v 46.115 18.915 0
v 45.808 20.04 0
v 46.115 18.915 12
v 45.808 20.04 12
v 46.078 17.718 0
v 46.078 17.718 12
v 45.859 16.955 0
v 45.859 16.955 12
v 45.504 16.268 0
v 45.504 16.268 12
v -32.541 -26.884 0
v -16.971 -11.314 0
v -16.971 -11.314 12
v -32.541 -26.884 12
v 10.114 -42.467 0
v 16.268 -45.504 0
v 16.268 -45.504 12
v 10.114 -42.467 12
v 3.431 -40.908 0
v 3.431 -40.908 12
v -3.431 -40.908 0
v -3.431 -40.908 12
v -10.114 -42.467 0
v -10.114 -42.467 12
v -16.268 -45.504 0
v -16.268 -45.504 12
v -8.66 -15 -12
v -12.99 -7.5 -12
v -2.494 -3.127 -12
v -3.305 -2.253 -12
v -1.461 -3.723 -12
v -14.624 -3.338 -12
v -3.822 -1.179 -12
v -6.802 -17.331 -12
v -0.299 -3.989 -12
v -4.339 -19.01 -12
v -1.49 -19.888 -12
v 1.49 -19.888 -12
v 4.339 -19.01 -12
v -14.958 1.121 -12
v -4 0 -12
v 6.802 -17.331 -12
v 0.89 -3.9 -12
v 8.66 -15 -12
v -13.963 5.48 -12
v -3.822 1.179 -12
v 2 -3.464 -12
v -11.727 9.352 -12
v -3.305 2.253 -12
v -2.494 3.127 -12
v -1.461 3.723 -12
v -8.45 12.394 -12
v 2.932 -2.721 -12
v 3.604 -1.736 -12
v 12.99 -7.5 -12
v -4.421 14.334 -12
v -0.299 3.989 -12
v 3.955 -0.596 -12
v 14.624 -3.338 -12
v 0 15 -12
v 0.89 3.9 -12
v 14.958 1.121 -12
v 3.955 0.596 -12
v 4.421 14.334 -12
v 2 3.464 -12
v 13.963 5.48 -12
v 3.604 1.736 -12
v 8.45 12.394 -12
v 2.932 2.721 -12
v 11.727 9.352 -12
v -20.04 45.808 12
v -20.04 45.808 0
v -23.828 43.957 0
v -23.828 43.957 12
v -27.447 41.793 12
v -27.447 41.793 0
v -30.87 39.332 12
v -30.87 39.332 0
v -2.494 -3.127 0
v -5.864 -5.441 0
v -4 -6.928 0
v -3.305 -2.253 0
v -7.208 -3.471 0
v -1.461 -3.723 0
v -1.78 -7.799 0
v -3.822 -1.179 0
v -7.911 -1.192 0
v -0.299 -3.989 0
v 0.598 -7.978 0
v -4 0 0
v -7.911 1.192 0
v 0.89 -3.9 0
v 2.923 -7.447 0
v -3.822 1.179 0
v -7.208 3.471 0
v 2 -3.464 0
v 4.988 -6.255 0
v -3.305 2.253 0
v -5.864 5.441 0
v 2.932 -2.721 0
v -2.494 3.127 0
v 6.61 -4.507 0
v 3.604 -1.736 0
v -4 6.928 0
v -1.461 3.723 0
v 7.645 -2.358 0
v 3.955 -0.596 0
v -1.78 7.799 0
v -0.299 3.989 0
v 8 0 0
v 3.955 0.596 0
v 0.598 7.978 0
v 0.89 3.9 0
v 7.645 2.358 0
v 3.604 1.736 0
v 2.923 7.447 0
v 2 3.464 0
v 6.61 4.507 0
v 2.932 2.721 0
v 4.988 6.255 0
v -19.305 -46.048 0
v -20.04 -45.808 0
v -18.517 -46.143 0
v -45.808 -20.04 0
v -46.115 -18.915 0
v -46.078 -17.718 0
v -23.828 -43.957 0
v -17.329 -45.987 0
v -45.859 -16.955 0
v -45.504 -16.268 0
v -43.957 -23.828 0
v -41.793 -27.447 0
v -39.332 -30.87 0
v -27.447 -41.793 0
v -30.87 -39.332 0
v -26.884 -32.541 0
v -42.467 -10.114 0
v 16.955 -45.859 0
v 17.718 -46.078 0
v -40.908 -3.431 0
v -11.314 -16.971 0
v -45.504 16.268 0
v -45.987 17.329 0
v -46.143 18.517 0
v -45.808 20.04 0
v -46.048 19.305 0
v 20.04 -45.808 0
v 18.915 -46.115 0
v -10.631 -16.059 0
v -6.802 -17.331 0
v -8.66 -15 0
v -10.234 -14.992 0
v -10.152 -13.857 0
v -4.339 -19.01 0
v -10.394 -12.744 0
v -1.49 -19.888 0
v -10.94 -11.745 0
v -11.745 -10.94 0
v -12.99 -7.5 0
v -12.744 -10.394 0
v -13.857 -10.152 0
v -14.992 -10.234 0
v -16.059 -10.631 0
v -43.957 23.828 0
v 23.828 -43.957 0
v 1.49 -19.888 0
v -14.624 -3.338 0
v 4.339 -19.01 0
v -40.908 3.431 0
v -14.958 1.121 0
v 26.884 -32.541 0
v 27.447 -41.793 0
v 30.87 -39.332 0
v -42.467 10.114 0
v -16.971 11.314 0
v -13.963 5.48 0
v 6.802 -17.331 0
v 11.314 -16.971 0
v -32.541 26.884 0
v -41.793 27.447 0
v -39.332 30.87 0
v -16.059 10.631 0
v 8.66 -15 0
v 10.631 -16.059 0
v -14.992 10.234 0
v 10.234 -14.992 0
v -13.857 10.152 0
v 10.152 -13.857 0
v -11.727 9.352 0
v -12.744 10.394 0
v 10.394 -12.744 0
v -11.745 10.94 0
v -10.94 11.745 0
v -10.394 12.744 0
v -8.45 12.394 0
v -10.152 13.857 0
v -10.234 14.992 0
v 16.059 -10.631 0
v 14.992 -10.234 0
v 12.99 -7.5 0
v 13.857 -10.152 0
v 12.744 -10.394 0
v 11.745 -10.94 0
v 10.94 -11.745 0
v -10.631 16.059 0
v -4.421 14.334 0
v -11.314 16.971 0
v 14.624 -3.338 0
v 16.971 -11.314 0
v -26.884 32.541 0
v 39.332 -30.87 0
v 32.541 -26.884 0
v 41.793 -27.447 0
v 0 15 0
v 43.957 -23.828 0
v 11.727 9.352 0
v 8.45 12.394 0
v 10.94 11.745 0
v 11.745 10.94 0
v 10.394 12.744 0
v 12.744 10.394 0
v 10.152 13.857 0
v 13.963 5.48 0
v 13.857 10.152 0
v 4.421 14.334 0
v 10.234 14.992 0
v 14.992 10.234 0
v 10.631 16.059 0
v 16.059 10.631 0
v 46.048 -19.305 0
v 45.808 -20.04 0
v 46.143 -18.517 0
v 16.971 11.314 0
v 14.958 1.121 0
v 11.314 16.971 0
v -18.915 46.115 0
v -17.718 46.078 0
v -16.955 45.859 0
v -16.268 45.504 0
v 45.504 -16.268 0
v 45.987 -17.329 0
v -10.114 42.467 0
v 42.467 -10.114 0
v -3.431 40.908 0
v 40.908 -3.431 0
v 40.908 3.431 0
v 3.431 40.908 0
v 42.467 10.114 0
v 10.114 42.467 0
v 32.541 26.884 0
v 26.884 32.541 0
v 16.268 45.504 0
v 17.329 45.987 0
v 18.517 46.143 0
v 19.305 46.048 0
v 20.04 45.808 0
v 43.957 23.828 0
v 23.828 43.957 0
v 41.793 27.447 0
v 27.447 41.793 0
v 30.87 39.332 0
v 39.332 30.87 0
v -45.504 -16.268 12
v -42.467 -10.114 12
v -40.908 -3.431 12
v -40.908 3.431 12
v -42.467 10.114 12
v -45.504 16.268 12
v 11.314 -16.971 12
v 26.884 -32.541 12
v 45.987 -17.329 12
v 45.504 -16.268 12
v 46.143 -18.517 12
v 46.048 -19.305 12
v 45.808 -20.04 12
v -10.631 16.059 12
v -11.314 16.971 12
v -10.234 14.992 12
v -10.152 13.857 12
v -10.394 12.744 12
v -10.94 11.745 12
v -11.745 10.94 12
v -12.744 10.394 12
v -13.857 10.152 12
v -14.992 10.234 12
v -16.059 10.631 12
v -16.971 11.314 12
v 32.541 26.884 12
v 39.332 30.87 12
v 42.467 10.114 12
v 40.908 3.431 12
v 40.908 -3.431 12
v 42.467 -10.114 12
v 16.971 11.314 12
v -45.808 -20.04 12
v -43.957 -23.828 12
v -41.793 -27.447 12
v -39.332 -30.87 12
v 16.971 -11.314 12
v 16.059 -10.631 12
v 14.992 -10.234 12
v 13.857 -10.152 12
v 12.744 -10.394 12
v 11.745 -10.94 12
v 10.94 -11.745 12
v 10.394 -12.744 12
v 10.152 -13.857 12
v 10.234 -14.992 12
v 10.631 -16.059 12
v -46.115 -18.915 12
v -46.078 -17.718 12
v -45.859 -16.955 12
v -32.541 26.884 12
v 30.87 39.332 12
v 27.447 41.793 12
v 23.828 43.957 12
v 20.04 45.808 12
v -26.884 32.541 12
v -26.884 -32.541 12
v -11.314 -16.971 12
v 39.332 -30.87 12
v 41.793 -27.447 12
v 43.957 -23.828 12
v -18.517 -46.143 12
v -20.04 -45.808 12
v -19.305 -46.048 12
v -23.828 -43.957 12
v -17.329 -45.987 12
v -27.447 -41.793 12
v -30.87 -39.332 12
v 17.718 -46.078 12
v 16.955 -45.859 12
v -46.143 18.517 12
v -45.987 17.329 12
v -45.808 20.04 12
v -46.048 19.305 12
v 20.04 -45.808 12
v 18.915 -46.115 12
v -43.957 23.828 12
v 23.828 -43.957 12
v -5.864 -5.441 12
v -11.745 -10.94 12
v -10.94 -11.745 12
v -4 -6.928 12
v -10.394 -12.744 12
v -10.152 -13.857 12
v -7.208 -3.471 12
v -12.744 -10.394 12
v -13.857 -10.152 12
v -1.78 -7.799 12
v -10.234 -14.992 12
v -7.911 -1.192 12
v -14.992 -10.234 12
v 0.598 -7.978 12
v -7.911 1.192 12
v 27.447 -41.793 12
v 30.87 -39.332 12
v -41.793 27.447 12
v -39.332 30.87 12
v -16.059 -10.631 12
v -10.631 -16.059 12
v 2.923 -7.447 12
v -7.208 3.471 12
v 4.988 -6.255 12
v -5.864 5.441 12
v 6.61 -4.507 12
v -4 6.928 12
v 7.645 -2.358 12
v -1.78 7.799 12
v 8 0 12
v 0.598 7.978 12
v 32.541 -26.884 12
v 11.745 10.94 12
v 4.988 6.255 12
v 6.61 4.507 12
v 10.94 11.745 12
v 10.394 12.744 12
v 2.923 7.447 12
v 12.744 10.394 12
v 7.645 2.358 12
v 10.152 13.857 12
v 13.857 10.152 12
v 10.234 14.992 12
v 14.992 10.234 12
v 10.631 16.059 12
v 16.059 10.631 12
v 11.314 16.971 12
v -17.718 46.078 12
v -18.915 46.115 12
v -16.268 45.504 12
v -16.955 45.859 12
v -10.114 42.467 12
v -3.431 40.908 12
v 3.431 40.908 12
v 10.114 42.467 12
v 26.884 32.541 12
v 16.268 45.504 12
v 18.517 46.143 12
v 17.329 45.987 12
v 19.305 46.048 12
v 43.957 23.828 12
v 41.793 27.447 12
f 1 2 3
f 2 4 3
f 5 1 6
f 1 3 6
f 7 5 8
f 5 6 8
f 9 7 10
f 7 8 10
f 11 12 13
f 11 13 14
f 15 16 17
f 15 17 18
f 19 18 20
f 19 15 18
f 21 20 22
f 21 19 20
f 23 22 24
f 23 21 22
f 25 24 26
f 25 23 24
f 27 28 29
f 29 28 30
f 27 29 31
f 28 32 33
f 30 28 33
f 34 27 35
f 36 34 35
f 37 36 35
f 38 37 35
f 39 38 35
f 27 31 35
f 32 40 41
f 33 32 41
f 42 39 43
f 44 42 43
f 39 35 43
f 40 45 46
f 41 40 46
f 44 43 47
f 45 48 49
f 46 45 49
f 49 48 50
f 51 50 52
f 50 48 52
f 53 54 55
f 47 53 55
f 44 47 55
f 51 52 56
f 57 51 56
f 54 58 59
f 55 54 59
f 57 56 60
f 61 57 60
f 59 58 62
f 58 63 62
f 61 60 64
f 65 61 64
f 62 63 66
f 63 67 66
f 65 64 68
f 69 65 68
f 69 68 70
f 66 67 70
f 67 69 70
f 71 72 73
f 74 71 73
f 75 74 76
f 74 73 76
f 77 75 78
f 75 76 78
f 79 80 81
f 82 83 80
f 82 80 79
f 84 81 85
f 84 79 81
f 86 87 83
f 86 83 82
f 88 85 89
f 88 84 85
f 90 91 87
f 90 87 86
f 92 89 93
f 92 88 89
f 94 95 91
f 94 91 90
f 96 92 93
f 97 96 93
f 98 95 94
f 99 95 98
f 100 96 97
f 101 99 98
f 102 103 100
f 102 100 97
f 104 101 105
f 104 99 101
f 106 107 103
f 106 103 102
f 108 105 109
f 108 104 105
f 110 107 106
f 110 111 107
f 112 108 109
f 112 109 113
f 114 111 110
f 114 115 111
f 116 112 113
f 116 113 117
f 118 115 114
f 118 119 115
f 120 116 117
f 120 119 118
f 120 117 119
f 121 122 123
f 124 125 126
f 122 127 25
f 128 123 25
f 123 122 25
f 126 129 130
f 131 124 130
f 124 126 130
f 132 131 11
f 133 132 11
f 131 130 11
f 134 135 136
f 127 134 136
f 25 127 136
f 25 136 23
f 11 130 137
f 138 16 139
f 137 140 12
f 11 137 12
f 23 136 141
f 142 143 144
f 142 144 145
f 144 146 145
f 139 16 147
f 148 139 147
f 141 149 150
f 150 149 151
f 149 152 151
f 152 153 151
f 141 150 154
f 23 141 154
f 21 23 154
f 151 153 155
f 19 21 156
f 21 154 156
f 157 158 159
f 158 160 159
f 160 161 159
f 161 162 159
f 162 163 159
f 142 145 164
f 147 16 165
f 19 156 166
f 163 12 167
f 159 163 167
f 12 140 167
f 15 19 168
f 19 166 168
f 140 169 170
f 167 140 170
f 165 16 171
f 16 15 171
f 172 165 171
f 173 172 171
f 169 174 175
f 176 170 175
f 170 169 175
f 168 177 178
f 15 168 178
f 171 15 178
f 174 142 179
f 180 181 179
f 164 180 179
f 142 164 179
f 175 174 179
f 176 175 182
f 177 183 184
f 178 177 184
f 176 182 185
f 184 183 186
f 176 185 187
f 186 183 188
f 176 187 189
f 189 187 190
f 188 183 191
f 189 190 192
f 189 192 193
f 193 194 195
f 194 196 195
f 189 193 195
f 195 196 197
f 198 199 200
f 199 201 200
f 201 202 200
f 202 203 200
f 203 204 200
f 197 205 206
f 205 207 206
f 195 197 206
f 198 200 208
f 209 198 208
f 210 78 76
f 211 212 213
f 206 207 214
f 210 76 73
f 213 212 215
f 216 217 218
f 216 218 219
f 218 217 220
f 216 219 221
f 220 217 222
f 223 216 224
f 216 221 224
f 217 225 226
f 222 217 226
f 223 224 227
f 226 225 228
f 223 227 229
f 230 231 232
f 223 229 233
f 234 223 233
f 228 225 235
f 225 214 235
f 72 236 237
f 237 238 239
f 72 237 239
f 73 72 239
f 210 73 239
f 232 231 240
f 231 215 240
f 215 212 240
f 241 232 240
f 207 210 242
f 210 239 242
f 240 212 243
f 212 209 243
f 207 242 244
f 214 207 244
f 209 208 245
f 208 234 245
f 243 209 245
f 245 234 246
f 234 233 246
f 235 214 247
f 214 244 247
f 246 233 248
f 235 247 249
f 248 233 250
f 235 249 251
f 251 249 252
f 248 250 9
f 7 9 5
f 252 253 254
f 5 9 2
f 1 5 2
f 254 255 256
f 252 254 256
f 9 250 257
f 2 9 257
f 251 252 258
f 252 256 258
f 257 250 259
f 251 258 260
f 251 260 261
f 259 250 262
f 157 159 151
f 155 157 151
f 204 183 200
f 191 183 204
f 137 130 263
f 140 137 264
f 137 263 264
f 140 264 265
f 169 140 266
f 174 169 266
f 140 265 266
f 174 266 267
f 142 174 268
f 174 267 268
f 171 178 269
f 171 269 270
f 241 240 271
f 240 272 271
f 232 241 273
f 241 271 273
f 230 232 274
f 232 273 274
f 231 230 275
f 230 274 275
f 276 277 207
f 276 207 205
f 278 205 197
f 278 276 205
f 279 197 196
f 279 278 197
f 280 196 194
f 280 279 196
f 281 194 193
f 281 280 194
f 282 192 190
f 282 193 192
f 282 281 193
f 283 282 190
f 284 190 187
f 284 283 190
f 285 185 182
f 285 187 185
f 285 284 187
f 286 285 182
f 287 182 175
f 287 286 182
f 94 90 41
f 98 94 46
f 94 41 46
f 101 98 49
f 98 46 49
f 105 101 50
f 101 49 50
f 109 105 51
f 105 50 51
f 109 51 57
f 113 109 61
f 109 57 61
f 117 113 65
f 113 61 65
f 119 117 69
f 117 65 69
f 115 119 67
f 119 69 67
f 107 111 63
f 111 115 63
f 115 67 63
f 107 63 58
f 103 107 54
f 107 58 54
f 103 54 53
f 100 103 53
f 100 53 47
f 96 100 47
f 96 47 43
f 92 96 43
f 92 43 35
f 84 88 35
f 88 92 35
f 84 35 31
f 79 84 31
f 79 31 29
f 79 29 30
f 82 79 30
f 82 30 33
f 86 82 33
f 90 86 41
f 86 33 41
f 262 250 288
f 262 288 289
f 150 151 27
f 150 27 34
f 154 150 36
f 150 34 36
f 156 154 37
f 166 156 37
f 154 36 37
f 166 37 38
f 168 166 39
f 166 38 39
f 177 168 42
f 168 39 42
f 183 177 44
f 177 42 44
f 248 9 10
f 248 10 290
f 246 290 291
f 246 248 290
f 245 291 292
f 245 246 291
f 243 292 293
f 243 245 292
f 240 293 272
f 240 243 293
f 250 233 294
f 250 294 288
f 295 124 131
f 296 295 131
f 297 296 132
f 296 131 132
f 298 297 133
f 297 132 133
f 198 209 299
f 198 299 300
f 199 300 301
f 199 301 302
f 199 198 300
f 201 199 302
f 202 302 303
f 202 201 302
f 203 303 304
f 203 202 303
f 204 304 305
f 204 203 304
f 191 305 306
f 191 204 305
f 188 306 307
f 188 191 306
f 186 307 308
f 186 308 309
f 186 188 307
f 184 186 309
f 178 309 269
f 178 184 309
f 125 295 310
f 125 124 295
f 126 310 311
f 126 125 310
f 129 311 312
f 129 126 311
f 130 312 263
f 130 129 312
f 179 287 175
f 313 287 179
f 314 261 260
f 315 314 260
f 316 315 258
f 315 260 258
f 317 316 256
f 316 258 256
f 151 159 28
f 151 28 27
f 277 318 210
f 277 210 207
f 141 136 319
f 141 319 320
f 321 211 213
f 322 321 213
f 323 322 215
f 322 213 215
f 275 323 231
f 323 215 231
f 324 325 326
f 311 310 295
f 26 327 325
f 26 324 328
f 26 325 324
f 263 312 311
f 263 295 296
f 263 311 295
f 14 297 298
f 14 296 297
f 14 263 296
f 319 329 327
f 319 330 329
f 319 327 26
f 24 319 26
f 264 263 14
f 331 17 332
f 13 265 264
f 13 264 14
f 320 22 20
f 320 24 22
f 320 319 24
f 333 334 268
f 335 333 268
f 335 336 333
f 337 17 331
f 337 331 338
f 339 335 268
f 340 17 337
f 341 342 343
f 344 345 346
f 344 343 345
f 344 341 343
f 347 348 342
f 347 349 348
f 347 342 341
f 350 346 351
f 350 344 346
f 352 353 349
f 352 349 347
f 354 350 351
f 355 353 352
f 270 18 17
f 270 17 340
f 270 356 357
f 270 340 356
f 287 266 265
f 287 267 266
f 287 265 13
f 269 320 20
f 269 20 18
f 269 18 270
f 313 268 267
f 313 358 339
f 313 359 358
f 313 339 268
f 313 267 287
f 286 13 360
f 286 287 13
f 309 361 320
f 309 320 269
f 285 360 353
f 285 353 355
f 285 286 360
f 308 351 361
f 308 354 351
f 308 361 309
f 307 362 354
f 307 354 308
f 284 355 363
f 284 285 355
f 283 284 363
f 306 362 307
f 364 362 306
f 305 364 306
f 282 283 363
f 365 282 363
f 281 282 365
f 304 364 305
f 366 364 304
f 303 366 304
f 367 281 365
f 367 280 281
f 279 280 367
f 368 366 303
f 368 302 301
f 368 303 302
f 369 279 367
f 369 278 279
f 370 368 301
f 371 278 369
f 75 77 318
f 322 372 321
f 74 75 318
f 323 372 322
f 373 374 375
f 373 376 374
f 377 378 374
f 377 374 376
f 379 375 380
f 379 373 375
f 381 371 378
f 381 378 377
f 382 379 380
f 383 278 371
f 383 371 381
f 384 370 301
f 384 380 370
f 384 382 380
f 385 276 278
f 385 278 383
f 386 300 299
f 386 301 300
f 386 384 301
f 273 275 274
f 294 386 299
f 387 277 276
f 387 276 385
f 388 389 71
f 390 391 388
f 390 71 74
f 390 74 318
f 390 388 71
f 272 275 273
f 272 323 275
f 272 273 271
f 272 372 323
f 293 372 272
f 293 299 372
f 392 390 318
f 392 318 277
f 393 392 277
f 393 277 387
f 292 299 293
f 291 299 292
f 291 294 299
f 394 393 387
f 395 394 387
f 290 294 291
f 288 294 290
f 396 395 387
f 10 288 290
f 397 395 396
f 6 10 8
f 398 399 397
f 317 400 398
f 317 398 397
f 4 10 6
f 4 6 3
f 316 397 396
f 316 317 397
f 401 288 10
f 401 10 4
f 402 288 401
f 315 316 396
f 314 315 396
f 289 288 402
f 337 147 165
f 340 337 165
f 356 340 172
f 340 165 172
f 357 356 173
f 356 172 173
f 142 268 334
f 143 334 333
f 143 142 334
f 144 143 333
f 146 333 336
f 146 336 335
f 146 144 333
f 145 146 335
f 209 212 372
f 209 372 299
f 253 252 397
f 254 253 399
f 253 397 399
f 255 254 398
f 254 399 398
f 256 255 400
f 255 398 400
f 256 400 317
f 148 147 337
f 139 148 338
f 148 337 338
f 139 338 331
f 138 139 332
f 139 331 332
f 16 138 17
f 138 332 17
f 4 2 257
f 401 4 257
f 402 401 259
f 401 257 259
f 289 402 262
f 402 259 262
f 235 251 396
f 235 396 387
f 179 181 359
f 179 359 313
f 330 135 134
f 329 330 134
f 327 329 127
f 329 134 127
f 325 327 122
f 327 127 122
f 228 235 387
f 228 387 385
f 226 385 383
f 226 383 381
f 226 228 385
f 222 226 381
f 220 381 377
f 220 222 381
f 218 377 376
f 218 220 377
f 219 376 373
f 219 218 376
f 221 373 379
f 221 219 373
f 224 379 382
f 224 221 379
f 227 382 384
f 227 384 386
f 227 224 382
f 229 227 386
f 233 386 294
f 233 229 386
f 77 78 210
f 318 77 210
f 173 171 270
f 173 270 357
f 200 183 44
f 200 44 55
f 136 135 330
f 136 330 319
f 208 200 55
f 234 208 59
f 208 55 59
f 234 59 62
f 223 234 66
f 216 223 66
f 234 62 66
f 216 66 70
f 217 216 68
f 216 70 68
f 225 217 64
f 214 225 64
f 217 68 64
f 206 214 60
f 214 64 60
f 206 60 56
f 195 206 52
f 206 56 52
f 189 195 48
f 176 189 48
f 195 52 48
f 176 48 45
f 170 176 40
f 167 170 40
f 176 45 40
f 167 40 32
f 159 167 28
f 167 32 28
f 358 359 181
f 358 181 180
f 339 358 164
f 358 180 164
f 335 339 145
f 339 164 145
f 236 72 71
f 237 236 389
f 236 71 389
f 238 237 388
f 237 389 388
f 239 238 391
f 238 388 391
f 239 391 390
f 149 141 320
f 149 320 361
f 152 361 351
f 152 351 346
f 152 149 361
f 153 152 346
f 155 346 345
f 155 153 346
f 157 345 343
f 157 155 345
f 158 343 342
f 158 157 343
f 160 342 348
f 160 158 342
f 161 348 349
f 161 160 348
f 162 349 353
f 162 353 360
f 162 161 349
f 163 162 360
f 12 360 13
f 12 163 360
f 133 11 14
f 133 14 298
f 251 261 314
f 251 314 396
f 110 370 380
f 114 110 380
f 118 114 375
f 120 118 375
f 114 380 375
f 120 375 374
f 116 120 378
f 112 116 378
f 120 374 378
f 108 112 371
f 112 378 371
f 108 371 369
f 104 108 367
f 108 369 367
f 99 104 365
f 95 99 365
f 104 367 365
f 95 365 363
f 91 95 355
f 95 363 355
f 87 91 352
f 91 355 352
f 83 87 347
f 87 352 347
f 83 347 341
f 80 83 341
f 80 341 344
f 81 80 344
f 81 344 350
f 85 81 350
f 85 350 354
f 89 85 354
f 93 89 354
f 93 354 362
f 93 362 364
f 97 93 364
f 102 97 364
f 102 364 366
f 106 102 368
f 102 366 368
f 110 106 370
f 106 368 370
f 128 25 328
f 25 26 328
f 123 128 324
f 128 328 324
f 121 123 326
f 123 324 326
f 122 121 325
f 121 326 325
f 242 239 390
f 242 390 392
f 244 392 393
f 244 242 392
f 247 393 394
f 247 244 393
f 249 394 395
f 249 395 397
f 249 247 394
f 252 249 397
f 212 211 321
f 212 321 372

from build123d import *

# Parameters (mm, degrees)
SKETCH1_R           = 50
SKETCH1_R_2         = 4
BOSS_EXTRUDE1_DEPTH = 12
SKETCH2_R           = 30
CUT_EXTRUDE1_DEPTH  = 72.721684308
CUT_EXTRUDE2_DEPTH  = 72.721684308
CHAMFER1_SIZE       = 7.819775181
CIRPATTERN1_DEPTH   = 12
FILLET1_R           = 4
BOSS_EXTRUDE2_START = 12
SKETCH4_R           = 4
BOSS_EXTRUDE2_DEPTH = 12
SKETCH5_R           = 8
CUT_EXTRUDE3_DEPTH  = 12


with BuildPart() as part:
    # Sketch1 → Boss-Extrude1 (new body)
    with BuildSketch(Plane.XY):
        Circle(SKETCH1_R)
        Circle(SKETCH1_R_2, mode=Mode.SUBTRACT)
    extrude(amount=BOSS_EXTRUDE1_DEPTH)

    # Sketch2 → Cut-Extrude1 (cut, through all)
    with BuildSketch(Plane.XY.offset(12)):
        with Locations((-70.710678119, 0)):
            Circle(SKETCH2_R)
    extrude(amount=-CUT_EXTRUDE1_DEPTH, mode=Mode.SUBTRACT)

    # Sketch3 → Cut-Extrude2 (cut, through all)
    with BuildSketch(Plane.XY.offset(12)):
        with BuildLine():
            Line((-32.526911935, 38.183766184), (-11.313708499, 16.970562748))
            ThreePointArc((-11.313708499, 16.970562748), (-11.313708499, 11.313708499), (-16.970562748, 11.313708499))
            Line((-16.970562748, 11.313708499), (-38.183766184, 32.526911935))
            ThreePointArc((-38.183766184, 32.526911935), (-38.183766184, 38.183766184), (-32.526911935, 38.183766184))
        make_face()
    extrude(amount=-CUT_EXTRUDE2_DEPTH, mode=Mode.SUBTRACT)

    # Chamfer1
    # the kernel refuses this chamfer: 7.819775181, 2 mm, written as the material it takes off along each edge
    with BuildSketch(Plane(origin=(-38.070447498, 32.413593249, 32.307159288), x_dir=(-0.6329652069887249, -0.7741802417665543, 0), z_dir=(0, 0, -1))) as chamfer1_piece_1:
        with BuildLine():
            Line((1.993389554, 0), (CHAMFER1_SIZE * 0.0998541086907, -CHAMFER1_SIZE * 0.995002088869))
            Line((CHAMFER1_SIZE * 0.0998541086907, -CHAMFER1_SIZE * 0.995002088869), (0, 0))
            ThreePointArc((0, 0), (1.020707521, 0.009929226), (1.993389554, 0))
        make_face()
    extrude(amount=52.614318575, mode=Mode.SUBTRACT)
    with BuildSketch(Plane(origin=(-32.413593249, 38.070447498, 32.307159288), x_dir=(0.7741802417665462, 0.6329652069887348, 0), z_dir=(0, 0, -1))) as chamfer1_piece_2:
        with BuildLine():
            Line((1.993389554, 0), (CHAMFER1_SIZE * 0.0998541086907, CHAMFER1_SIZE * 0.995002088869))
            Line((CHAMFER1_SIZE * 0.0998541086907, CHAMFER1_SIZE * 0.995002088869), (0, 0))
            ThreePointArc((0, 0), (1.020707521, -0.009929226), (1.993389554, 0))
        make_face()
    extrude(amount=52.614318575, mode=Mode.SUBTRACT)

    # CirPattern1: read off the stored shape, not the designer's step
    # CirPattern1 outline → CirPattern1 (cut)
    with BuildSketch(Plane.XY):
        with BuildLine():
            Line((39.33219373, -30.870350442), (32.541031441, -26.884177191))
            Line((32.541031441, -26.884177191), (16.970562748, -11.313708499))
            ThreePointArc((16.970562748, -11.313708499), (11.313708499, -11.313708499), (11.313708499, -16.970562748))
            Line((11.313708499, -16.970562748), (26.884177191, -32.541031441))
            Line((26.884177191, -32.541031441), (30.870350442, -39.33219373))
            ThreePointArc((30.870350442, -39.33219373), (35.355339059, -35.355339059), (39.33219373, -30.870350442))
        make_face()
        with BuildLine():
            ThreePointArc((-17.944358445, 46.669047558), (0, 40.710678119), (17.944358445, 46.669047558))
            ThreePointArc((17.944358445, 46.669047558), (0, 50), (-17.944358445, 46.669047558))
        make_face()
        with BuildLine():
            Line((32.541031441, 26.884177191), (39.33219373, 30.870350442))
            ThreePointArc((39.33219373, 30.870350442), (35.35533906, 35.35533906), (30.870350442, 39.33219373))
            Line((30.870350442, 39.33219373), (26.884177191, 32.541031441))
            Line((26.884177191, 32.541031441), (11.313708499, 16.970562748))
            ThreePointArc((11.313708499, 16.970562748), (11.313708499, 11.313708499), (16.970562748, 11.313708499))
            Line((16.970562748, 11.313708499), (32.541031441, 26.884177191))
        make_face()
        with BuildLine():
            ThreePointArc((46.669047558, 17.944358445), (40.710678119, 0), (46.669047558, -17.944358445))
            ThreePointArc((46.669047558, -17.944358445), (50, 0), (46.669047558, 17.944358445))
        make_face()
        with BuildLine():
            ThreePointArc((-39.33219373, -30.870350442), (-35.355339059, -35.355339059), (-30.870350442, -39.332193729))
            Line((-30.870350442, -39.332193729), (-26.884177191, -32.541031441))
            Line((-26.884177191, -32.541031441), (-11.313708499, -16.970562748))
            ThreePointArc((-11.313708499, -16.970562748), (-11.313708499, -11.313708499), (-16.970562748, -11.313708499))
            Line((-16.970562748, -11.313708499), (-32.541031441, -26.884177191))
            Line((-32.541031441, -26.884177191), (-39.33219373, -30.870350442))
        make_face()
        with BuildLine():
            ThreePointArc((-17.944358445, -46.669047558), (0, -50), (17.944358445, -46.669047558))
            ThreePointArc((17.944358445, -46.669047558), (0, -40.710678119), (-17.944358445, -46.669047558))
        make_face()
    extrude(amount=CIRPATTERN1_DEPTH, mode=Mode.SUBTRACT)

    # Fillet1
    fillet1_edges = [part.edges().sort_by_distance(p)[0] for p in [
        (-46.669047558, -17.944358445, 6),
        (-46.669047558, 17.944358445, 6),
        (17.944358445, 46.669047558, 6),
        (-17.944358445, 46.669047558, 6),
        (46.669047558, -17.944358445, 6),
        (46.669047558, 17.944358445, 6),
        (-17.944358445, -46.669047558, 6),
        (17.944358445, -46.669047558, 6),
    ]]
    fillet(fillet1_edges, radius=FILLET1_R)

    # Sketch4 → Boss-Extrude2 (add)
    with BuildSketch(Plane(origin=(0, 0, 0), x_dir=(-1, 0, 0), z_dir=(0, 0, -1)).offset(BOSS_EXTRUDE2_START)):
        with BuildLine():
            Line((12.990381057, -7.5), (8.660254038, -15))
            ThreePointArc((8.660254038, -15), (0, -20), (-8.660254038, -15))
            Line((-8.660254038, -15), (-12.990381057, -7.5))
            ThreePointArc((-12.990381057, -7.5), (0, 15), (12.990381057, -7.5))
        make_face()
        Circle(SKETCH4_R, mode=Mode.SUBTRACT)
    extrude(amount=-BOSS_EXTRUDE2_DEPTH)

    # Sketch5 → Cut-Extrude3 (cut)
    with BuildSketch(Plane.XY.offset(12)):
        Circle(SKETCH5_R)
    extrude(amount=-CUT_EXTRUDE3_DEPTH, mode=Mode.SUBTRACT)


solid = part.part
